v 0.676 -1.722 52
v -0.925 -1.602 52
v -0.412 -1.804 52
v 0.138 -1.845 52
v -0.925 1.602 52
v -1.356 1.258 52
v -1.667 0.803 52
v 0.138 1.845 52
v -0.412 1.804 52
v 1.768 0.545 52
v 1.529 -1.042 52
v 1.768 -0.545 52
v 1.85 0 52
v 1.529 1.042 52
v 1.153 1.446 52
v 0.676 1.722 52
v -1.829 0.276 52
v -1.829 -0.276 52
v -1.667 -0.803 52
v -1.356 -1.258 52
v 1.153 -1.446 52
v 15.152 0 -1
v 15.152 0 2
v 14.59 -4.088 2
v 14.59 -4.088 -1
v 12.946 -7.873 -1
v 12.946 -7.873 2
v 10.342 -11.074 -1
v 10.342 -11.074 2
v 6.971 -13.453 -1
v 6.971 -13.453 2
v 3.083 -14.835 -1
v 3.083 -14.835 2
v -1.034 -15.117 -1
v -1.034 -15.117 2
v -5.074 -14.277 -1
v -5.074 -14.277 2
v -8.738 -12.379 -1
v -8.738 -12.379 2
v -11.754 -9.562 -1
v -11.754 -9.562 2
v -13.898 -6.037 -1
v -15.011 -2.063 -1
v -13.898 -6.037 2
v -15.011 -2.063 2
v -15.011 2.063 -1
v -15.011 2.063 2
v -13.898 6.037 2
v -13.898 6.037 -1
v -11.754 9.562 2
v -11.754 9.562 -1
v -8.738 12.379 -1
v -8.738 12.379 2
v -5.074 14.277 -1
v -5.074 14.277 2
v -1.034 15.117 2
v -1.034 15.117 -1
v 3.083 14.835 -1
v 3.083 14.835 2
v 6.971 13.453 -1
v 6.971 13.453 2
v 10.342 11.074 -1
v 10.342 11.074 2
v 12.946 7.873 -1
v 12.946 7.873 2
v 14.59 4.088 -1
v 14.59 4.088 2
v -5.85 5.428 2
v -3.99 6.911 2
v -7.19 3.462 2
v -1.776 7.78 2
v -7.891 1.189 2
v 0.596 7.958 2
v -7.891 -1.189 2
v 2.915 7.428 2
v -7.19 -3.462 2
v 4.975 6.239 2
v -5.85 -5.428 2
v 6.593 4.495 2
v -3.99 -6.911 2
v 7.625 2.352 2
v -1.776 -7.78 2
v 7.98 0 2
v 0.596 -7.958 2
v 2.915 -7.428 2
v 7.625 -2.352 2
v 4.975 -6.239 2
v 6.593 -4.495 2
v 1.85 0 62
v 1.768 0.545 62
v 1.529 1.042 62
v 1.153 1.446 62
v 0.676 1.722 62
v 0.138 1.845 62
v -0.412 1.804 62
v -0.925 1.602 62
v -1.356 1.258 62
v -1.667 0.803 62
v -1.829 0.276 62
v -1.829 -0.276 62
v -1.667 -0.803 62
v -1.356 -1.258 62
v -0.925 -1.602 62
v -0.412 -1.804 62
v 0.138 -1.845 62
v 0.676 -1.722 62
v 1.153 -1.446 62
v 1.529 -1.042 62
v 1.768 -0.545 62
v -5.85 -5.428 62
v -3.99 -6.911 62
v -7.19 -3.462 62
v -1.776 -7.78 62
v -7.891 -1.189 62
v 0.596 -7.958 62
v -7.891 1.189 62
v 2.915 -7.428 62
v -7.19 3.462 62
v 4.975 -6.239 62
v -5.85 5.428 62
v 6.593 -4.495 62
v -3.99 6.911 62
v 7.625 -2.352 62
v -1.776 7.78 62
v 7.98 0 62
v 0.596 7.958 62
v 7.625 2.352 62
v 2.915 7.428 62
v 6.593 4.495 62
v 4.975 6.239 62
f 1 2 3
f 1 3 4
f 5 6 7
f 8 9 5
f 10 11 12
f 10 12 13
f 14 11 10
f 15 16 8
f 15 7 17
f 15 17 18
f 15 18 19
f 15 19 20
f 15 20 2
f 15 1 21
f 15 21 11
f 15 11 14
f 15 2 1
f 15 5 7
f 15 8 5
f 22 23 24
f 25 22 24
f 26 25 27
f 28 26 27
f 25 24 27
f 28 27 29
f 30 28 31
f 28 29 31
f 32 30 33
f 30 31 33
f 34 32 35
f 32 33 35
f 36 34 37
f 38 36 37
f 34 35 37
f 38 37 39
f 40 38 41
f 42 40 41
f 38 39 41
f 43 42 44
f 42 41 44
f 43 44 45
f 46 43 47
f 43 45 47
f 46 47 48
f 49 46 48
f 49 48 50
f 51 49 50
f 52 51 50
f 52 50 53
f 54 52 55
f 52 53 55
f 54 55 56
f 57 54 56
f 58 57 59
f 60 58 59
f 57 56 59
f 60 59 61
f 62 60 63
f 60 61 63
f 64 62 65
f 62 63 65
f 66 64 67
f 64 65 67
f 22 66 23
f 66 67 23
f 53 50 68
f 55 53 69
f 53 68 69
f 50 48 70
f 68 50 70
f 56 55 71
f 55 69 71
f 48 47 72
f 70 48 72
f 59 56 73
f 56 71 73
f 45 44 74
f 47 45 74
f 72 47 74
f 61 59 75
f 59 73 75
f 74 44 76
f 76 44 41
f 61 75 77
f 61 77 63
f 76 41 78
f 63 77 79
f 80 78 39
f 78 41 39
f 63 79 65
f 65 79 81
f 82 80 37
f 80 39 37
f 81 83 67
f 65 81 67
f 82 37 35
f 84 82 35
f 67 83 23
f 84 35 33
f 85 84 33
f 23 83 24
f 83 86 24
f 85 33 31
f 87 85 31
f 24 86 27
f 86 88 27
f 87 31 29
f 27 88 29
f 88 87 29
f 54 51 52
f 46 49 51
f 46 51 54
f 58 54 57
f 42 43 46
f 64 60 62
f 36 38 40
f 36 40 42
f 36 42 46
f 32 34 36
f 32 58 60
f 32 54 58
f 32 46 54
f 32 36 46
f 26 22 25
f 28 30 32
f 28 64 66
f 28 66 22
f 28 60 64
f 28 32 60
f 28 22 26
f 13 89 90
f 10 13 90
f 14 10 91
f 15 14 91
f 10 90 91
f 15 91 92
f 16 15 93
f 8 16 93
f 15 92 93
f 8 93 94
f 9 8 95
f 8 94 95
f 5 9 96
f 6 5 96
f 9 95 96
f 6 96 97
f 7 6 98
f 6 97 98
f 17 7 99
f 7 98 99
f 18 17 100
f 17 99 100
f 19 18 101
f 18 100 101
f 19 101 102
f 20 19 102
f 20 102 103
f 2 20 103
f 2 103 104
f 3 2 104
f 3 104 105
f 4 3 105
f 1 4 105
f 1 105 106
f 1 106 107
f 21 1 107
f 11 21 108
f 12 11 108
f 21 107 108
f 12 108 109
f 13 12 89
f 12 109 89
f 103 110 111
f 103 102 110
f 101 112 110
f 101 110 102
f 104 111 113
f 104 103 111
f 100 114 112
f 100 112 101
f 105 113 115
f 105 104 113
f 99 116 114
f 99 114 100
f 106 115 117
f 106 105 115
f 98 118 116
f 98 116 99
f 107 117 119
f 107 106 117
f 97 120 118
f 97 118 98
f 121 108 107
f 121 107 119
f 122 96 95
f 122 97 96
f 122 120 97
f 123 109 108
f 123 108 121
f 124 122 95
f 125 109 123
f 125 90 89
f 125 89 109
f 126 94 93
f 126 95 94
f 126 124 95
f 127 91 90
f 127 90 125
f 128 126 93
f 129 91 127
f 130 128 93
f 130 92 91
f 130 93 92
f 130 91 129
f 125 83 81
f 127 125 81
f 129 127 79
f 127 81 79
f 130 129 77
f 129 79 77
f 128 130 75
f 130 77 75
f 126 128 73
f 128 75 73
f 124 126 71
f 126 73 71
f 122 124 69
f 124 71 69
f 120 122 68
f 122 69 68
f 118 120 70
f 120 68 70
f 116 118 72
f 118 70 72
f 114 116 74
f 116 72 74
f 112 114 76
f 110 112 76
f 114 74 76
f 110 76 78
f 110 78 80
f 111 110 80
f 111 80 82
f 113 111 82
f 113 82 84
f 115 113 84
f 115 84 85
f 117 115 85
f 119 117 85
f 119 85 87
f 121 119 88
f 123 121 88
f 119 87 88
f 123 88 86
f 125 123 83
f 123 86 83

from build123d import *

# Parameters (mm, degrees)
SKETCH001_R  = 7.98
PAD001_DEPTH = 60
SKETCH002_R  = 1.85
POCKET_DEPTH = 10
SKETCH_R     = 15.152226
PAD_DEPTH    = 3


with BuildPart() as part:
    # Sketch001 → Pad001 (new body)
    with BuildSketch(Plane.XY.offset(2)):
        Circle(SKETCH001_R)
    extrude(amount=PAD001_DEPTH)

    # Sketch002 → Pocket (cut)
    with BuildSketch(Plane.XY.offset(62)):
        Circle(SKETCH002_R)
    extrude(amount=-POCKET_DEPTH, mode=Mode.SUBTRACT)

    # Sketch → Pad (new body)
    with BuildSketch(Plane(origin=(0, 0, 2), x_dir=(1, 0, 0), z_dir=(0, 0, -1))):
        Circle(SKETCH_R)
    extrude(amount=PAD_DEPTH)


solid = part.part
